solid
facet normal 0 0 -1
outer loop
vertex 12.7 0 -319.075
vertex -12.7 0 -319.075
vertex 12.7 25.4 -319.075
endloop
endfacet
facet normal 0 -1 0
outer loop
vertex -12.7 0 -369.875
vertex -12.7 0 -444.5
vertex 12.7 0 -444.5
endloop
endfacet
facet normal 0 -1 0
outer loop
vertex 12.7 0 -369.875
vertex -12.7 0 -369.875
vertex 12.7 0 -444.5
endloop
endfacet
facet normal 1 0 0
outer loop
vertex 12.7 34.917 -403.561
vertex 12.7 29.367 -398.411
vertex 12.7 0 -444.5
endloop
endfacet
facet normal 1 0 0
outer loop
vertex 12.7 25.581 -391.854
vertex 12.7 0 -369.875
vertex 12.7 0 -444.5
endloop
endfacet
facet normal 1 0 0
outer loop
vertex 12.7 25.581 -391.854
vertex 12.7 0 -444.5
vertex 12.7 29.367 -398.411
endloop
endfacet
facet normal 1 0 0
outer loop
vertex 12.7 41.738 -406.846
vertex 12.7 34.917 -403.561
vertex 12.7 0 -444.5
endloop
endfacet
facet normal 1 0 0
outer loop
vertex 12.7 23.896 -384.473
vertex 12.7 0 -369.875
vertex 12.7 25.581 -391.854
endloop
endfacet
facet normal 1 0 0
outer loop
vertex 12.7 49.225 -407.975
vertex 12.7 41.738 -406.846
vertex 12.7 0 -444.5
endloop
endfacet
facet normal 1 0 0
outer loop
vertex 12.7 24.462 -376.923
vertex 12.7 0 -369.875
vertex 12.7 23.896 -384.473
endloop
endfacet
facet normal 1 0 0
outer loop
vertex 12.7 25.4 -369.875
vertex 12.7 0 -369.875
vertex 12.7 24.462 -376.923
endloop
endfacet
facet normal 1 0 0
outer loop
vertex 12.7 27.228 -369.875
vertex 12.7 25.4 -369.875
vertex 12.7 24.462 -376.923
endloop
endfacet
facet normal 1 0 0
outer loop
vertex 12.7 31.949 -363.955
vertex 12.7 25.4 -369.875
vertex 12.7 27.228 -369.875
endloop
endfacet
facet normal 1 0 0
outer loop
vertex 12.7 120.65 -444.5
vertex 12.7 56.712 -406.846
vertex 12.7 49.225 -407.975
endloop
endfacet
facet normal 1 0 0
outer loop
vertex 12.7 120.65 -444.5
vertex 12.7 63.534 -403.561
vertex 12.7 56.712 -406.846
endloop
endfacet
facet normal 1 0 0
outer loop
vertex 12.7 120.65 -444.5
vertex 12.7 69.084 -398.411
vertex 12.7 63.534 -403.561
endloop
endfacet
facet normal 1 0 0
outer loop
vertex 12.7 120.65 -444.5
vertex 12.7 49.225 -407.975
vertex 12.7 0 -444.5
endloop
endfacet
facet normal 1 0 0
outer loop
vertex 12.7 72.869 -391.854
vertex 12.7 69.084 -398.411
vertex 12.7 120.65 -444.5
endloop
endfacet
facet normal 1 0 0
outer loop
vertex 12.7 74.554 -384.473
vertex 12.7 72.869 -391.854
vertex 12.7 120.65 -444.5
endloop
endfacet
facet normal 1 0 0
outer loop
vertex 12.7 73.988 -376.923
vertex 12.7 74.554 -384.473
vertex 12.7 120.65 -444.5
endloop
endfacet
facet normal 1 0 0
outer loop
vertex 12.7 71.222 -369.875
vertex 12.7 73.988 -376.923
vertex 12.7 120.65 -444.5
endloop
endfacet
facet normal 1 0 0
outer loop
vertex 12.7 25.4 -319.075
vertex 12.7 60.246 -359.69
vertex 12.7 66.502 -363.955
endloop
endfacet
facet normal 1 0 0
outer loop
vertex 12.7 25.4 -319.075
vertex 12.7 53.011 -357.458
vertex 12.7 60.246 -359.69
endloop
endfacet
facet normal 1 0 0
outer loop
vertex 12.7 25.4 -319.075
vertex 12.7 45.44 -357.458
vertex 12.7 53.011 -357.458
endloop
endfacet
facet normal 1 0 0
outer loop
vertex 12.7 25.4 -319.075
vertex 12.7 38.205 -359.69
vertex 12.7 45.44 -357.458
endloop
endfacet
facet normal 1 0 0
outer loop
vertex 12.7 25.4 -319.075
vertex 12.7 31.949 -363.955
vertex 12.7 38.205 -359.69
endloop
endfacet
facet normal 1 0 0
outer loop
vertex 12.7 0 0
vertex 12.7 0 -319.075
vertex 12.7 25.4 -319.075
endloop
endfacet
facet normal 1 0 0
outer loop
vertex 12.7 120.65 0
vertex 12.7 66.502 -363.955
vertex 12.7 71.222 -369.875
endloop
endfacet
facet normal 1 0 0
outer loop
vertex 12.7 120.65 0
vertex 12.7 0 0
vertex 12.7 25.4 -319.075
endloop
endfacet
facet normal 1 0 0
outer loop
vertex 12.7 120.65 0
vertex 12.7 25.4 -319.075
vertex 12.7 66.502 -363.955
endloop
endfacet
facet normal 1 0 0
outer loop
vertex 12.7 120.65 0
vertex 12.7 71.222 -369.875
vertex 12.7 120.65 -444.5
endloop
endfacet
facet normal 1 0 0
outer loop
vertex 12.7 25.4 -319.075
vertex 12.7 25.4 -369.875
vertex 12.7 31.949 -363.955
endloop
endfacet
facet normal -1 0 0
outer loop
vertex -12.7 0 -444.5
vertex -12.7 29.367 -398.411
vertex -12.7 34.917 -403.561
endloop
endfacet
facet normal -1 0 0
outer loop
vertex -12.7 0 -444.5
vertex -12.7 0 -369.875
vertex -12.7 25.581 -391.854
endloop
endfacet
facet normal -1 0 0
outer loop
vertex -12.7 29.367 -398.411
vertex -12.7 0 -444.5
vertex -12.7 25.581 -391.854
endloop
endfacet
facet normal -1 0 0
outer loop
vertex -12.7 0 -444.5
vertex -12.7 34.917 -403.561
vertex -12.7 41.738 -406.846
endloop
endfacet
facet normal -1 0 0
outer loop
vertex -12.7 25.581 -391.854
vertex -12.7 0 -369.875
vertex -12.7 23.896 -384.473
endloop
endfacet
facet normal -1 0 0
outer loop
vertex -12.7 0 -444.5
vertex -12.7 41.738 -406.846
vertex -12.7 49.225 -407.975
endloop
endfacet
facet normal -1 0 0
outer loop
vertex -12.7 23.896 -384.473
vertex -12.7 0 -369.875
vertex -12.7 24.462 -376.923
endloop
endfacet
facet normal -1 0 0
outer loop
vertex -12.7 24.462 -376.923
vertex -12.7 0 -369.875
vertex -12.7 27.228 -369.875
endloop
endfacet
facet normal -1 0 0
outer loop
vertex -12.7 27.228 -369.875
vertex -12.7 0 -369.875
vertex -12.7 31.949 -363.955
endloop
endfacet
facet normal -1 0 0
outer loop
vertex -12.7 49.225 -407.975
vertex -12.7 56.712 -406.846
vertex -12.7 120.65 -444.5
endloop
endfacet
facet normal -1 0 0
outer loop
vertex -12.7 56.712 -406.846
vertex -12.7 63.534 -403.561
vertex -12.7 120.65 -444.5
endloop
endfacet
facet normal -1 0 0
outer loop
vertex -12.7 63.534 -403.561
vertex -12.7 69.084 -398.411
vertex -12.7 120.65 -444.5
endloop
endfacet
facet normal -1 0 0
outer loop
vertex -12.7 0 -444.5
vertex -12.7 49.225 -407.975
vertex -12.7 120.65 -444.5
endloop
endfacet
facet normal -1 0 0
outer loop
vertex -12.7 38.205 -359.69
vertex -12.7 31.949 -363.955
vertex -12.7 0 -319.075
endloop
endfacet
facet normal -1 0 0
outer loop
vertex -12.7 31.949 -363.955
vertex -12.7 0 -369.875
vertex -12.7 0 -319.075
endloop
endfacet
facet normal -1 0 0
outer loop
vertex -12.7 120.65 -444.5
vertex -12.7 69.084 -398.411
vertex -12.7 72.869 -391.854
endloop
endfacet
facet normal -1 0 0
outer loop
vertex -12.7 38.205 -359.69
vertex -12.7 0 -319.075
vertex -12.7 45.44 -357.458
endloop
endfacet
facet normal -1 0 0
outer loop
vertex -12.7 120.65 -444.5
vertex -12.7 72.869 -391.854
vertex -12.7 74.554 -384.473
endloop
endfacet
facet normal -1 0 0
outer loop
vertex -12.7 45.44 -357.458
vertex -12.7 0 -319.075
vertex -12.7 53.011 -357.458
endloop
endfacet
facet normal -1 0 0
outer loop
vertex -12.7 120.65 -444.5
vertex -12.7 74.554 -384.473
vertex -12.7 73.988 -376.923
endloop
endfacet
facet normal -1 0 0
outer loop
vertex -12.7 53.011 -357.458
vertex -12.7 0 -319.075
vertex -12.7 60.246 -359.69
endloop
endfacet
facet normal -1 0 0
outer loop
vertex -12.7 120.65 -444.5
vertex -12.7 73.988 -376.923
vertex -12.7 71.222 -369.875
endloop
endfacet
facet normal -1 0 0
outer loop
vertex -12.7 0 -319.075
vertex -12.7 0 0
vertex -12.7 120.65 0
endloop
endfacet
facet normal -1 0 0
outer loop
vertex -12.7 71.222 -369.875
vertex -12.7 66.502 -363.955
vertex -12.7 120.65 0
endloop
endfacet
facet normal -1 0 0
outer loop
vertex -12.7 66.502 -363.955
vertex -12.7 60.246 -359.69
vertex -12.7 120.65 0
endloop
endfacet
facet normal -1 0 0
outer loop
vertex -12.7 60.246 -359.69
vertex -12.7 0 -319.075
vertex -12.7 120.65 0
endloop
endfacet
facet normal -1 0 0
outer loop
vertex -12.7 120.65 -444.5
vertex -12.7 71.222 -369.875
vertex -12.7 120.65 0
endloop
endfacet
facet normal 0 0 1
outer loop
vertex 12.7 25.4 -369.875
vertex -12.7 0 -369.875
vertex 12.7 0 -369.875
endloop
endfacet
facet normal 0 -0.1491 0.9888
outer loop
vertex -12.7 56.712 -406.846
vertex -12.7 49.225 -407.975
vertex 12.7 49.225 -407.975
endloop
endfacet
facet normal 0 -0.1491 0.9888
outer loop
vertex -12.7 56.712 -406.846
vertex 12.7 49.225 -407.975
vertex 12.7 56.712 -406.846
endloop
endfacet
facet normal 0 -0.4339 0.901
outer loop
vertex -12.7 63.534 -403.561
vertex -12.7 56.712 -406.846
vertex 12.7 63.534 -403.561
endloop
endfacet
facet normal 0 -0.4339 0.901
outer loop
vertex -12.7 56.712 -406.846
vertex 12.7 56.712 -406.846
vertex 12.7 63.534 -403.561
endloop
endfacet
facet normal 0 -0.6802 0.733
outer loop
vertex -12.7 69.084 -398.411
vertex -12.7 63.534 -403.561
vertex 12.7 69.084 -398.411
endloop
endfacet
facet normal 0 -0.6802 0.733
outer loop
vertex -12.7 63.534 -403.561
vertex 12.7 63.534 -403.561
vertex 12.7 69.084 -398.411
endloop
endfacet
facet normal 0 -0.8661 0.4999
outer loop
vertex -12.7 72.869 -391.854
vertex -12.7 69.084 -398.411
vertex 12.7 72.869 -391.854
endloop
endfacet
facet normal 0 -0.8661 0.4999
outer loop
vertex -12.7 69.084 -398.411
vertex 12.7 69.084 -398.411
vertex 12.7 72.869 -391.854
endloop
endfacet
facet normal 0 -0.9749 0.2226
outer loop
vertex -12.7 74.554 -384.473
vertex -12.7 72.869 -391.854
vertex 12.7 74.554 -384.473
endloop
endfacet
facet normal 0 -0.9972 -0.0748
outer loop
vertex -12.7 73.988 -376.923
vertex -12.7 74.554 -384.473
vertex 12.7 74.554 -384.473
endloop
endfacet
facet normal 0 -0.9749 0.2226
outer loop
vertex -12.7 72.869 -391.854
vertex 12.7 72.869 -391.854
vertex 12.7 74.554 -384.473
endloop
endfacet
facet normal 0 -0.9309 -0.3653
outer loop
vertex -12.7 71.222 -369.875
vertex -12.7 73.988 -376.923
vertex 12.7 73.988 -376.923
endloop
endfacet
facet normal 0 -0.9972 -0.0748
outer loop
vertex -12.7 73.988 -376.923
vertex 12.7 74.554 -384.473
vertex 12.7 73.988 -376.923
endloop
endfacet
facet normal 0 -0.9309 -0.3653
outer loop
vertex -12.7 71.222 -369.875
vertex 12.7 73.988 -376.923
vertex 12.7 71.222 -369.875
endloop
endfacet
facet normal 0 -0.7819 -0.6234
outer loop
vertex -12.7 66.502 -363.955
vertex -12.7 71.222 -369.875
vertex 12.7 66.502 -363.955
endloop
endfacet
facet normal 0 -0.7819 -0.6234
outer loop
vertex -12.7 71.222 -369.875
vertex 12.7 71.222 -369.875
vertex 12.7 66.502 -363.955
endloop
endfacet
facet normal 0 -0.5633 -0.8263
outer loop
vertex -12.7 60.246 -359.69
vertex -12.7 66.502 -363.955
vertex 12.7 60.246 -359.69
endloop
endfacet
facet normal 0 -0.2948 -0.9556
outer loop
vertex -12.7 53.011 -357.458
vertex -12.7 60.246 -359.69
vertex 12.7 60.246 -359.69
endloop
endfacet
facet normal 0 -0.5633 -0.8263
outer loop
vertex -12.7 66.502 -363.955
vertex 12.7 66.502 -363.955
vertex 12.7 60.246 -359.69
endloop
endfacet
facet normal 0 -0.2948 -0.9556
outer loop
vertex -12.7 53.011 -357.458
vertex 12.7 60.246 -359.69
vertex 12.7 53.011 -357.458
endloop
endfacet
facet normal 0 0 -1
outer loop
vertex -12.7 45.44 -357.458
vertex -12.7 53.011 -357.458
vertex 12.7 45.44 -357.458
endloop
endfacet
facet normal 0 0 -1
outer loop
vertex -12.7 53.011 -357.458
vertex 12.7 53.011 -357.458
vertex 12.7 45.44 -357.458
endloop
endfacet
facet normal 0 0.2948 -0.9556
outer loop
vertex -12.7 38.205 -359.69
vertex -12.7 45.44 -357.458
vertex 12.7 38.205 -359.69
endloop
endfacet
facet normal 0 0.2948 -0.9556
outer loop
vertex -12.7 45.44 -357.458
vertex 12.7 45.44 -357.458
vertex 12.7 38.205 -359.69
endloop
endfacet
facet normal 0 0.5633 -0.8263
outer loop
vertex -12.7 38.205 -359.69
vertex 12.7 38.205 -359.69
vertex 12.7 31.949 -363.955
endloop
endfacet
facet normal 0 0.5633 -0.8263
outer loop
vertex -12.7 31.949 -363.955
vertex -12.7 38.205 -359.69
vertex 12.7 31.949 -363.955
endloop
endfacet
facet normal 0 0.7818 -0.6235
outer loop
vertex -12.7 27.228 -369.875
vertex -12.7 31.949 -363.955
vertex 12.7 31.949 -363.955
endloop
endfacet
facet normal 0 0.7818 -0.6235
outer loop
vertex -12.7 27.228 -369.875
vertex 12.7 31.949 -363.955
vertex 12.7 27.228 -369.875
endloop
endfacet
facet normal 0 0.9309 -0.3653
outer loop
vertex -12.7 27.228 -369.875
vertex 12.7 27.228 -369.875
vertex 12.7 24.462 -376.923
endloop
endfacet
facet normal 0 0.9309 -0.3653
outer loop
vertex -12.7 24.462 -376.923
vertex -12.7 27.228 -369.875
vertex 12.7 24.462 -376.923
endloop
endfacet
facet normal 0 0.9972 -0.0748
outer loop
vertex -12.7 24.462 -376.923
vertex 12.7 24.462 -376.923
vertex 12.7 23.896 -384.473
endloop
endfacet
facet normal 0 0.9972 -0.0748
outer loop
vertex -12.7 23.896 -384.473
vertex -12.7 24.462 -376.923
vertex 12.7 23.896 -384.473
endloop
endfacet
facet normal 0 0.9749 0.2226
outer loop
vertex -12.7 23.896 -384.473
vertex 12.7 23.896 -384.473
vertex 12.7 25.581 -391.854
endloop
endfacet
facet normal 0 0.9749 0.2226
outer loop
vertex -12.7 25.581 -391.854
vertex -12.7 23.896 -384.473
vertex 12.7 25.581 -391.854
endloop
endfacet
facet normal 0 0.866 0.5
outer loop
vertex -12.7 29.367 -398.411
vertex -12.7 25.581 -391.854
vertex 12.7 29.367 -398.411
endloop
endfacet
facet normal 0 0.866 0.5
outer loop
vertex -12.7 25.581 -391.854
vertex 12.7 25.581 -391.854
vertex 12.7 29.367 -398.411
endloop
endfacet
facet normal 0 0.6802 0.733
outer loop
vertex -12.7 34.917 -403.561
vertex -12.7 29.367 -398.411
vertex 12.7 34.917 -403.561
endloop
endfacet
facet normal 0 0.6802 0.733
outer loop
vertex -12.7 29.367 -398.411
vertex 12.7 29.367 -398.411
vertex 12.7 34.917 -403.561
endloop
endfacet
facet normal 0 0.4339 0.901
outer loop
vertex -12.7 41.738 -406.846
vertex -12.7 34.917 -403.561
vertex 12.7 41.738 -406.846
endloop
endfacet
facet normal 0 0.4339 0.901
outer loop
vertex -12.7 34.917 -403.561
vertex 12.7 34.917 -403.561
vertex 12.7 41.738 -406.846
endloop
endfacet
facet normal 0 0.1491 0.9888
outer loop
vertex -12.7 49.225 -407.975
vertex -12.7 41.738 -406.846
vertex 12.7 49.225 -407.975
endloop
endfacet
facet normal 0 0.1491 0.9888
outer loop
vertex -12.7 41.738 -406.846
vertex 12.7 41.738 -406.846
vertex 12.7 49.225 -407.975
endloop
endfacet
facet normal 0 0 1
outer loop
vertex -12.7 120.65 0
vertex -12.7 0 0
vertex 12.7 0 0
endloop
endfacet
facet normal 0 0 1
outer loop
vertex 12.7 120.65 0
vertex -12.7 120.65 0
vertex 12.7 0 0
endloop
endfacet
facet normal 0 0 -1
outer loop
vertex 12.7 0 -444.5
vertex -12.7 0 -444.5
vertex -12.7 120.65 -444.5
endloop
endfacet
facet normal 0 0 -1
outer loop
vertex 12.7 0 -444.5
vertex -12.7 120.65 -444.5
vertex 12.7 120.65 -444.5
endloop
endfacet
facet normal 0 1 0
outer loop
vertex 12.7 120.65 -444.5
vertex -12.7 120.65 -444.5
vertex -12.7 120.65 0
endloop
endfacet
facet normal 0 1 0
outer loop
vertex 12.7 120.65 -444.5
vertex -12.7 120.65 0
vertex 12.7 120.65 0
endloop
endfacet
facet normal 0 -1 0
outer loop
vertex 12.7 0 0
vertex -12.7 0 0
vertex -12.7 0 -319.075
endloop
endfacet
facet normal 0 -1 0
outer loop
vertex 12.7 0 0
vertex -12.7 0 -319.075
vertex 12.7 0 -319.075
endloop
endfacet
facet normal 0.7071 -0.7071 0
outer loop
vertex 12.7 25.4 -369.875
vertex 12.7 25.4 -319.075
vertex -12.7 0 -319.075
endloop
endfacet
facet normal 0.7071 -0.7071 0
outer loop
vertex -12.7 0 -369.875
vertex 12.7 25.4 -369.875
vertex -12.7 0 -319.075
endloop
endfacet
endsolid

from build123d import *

# Parameters (mm, degrees)
SKETCH1_W          = 25.4
SKETCH1_H          = 120.65
EXTRUDE1_DEPTH     = 444.5
SKETCH2_R          = 25.4
CUT_EXTRUDE1_DEPTH = 25.4
CUT_EXTRUDE2_DEPTH = 50.8


with BuildPart() as part:
    # Sketch1 → Extrude1 (new body)
    with BuildSketch(Plane.XY):
        with Locations((0, 60.325)):
            Rectangle(SKETCH1_W, SKETCH1_H)
    extrude(amount=-EXTRUDE1_DEPTH)

    # Sketch2 → Cut-Extrude1 (cut, symmetric)
    with BuildSketch(Plane(origin=(0, 0, 0), x_dir=(0, 0, -1), z_dir=(1, 0, 0))):
        with Locations((382.5748, 49.2252)):
            Circle(SKETCH2_R)
    extrude(amount=CUT_EXTRUDE1_DEPTH, both=True, mode=Mode.SUBTRACT)

    # Sketch4 → Cut-Extrude2 (cut)
    with BuildSketch(Plane(origin=(0, 0, -369.8748), x_dir=(-1, 0, 0), z_dir=(0, 0, -1))):
        Polygon((-22.207602217, 34.907602217), (28.73114164, -16.03114164), (-22.207602217, -16.03114164), align=None)
    extrude(amount=-CUT_EXTRUDE2_DEPTH, mode=Mode.SUBTRACT)


solid = part.part
